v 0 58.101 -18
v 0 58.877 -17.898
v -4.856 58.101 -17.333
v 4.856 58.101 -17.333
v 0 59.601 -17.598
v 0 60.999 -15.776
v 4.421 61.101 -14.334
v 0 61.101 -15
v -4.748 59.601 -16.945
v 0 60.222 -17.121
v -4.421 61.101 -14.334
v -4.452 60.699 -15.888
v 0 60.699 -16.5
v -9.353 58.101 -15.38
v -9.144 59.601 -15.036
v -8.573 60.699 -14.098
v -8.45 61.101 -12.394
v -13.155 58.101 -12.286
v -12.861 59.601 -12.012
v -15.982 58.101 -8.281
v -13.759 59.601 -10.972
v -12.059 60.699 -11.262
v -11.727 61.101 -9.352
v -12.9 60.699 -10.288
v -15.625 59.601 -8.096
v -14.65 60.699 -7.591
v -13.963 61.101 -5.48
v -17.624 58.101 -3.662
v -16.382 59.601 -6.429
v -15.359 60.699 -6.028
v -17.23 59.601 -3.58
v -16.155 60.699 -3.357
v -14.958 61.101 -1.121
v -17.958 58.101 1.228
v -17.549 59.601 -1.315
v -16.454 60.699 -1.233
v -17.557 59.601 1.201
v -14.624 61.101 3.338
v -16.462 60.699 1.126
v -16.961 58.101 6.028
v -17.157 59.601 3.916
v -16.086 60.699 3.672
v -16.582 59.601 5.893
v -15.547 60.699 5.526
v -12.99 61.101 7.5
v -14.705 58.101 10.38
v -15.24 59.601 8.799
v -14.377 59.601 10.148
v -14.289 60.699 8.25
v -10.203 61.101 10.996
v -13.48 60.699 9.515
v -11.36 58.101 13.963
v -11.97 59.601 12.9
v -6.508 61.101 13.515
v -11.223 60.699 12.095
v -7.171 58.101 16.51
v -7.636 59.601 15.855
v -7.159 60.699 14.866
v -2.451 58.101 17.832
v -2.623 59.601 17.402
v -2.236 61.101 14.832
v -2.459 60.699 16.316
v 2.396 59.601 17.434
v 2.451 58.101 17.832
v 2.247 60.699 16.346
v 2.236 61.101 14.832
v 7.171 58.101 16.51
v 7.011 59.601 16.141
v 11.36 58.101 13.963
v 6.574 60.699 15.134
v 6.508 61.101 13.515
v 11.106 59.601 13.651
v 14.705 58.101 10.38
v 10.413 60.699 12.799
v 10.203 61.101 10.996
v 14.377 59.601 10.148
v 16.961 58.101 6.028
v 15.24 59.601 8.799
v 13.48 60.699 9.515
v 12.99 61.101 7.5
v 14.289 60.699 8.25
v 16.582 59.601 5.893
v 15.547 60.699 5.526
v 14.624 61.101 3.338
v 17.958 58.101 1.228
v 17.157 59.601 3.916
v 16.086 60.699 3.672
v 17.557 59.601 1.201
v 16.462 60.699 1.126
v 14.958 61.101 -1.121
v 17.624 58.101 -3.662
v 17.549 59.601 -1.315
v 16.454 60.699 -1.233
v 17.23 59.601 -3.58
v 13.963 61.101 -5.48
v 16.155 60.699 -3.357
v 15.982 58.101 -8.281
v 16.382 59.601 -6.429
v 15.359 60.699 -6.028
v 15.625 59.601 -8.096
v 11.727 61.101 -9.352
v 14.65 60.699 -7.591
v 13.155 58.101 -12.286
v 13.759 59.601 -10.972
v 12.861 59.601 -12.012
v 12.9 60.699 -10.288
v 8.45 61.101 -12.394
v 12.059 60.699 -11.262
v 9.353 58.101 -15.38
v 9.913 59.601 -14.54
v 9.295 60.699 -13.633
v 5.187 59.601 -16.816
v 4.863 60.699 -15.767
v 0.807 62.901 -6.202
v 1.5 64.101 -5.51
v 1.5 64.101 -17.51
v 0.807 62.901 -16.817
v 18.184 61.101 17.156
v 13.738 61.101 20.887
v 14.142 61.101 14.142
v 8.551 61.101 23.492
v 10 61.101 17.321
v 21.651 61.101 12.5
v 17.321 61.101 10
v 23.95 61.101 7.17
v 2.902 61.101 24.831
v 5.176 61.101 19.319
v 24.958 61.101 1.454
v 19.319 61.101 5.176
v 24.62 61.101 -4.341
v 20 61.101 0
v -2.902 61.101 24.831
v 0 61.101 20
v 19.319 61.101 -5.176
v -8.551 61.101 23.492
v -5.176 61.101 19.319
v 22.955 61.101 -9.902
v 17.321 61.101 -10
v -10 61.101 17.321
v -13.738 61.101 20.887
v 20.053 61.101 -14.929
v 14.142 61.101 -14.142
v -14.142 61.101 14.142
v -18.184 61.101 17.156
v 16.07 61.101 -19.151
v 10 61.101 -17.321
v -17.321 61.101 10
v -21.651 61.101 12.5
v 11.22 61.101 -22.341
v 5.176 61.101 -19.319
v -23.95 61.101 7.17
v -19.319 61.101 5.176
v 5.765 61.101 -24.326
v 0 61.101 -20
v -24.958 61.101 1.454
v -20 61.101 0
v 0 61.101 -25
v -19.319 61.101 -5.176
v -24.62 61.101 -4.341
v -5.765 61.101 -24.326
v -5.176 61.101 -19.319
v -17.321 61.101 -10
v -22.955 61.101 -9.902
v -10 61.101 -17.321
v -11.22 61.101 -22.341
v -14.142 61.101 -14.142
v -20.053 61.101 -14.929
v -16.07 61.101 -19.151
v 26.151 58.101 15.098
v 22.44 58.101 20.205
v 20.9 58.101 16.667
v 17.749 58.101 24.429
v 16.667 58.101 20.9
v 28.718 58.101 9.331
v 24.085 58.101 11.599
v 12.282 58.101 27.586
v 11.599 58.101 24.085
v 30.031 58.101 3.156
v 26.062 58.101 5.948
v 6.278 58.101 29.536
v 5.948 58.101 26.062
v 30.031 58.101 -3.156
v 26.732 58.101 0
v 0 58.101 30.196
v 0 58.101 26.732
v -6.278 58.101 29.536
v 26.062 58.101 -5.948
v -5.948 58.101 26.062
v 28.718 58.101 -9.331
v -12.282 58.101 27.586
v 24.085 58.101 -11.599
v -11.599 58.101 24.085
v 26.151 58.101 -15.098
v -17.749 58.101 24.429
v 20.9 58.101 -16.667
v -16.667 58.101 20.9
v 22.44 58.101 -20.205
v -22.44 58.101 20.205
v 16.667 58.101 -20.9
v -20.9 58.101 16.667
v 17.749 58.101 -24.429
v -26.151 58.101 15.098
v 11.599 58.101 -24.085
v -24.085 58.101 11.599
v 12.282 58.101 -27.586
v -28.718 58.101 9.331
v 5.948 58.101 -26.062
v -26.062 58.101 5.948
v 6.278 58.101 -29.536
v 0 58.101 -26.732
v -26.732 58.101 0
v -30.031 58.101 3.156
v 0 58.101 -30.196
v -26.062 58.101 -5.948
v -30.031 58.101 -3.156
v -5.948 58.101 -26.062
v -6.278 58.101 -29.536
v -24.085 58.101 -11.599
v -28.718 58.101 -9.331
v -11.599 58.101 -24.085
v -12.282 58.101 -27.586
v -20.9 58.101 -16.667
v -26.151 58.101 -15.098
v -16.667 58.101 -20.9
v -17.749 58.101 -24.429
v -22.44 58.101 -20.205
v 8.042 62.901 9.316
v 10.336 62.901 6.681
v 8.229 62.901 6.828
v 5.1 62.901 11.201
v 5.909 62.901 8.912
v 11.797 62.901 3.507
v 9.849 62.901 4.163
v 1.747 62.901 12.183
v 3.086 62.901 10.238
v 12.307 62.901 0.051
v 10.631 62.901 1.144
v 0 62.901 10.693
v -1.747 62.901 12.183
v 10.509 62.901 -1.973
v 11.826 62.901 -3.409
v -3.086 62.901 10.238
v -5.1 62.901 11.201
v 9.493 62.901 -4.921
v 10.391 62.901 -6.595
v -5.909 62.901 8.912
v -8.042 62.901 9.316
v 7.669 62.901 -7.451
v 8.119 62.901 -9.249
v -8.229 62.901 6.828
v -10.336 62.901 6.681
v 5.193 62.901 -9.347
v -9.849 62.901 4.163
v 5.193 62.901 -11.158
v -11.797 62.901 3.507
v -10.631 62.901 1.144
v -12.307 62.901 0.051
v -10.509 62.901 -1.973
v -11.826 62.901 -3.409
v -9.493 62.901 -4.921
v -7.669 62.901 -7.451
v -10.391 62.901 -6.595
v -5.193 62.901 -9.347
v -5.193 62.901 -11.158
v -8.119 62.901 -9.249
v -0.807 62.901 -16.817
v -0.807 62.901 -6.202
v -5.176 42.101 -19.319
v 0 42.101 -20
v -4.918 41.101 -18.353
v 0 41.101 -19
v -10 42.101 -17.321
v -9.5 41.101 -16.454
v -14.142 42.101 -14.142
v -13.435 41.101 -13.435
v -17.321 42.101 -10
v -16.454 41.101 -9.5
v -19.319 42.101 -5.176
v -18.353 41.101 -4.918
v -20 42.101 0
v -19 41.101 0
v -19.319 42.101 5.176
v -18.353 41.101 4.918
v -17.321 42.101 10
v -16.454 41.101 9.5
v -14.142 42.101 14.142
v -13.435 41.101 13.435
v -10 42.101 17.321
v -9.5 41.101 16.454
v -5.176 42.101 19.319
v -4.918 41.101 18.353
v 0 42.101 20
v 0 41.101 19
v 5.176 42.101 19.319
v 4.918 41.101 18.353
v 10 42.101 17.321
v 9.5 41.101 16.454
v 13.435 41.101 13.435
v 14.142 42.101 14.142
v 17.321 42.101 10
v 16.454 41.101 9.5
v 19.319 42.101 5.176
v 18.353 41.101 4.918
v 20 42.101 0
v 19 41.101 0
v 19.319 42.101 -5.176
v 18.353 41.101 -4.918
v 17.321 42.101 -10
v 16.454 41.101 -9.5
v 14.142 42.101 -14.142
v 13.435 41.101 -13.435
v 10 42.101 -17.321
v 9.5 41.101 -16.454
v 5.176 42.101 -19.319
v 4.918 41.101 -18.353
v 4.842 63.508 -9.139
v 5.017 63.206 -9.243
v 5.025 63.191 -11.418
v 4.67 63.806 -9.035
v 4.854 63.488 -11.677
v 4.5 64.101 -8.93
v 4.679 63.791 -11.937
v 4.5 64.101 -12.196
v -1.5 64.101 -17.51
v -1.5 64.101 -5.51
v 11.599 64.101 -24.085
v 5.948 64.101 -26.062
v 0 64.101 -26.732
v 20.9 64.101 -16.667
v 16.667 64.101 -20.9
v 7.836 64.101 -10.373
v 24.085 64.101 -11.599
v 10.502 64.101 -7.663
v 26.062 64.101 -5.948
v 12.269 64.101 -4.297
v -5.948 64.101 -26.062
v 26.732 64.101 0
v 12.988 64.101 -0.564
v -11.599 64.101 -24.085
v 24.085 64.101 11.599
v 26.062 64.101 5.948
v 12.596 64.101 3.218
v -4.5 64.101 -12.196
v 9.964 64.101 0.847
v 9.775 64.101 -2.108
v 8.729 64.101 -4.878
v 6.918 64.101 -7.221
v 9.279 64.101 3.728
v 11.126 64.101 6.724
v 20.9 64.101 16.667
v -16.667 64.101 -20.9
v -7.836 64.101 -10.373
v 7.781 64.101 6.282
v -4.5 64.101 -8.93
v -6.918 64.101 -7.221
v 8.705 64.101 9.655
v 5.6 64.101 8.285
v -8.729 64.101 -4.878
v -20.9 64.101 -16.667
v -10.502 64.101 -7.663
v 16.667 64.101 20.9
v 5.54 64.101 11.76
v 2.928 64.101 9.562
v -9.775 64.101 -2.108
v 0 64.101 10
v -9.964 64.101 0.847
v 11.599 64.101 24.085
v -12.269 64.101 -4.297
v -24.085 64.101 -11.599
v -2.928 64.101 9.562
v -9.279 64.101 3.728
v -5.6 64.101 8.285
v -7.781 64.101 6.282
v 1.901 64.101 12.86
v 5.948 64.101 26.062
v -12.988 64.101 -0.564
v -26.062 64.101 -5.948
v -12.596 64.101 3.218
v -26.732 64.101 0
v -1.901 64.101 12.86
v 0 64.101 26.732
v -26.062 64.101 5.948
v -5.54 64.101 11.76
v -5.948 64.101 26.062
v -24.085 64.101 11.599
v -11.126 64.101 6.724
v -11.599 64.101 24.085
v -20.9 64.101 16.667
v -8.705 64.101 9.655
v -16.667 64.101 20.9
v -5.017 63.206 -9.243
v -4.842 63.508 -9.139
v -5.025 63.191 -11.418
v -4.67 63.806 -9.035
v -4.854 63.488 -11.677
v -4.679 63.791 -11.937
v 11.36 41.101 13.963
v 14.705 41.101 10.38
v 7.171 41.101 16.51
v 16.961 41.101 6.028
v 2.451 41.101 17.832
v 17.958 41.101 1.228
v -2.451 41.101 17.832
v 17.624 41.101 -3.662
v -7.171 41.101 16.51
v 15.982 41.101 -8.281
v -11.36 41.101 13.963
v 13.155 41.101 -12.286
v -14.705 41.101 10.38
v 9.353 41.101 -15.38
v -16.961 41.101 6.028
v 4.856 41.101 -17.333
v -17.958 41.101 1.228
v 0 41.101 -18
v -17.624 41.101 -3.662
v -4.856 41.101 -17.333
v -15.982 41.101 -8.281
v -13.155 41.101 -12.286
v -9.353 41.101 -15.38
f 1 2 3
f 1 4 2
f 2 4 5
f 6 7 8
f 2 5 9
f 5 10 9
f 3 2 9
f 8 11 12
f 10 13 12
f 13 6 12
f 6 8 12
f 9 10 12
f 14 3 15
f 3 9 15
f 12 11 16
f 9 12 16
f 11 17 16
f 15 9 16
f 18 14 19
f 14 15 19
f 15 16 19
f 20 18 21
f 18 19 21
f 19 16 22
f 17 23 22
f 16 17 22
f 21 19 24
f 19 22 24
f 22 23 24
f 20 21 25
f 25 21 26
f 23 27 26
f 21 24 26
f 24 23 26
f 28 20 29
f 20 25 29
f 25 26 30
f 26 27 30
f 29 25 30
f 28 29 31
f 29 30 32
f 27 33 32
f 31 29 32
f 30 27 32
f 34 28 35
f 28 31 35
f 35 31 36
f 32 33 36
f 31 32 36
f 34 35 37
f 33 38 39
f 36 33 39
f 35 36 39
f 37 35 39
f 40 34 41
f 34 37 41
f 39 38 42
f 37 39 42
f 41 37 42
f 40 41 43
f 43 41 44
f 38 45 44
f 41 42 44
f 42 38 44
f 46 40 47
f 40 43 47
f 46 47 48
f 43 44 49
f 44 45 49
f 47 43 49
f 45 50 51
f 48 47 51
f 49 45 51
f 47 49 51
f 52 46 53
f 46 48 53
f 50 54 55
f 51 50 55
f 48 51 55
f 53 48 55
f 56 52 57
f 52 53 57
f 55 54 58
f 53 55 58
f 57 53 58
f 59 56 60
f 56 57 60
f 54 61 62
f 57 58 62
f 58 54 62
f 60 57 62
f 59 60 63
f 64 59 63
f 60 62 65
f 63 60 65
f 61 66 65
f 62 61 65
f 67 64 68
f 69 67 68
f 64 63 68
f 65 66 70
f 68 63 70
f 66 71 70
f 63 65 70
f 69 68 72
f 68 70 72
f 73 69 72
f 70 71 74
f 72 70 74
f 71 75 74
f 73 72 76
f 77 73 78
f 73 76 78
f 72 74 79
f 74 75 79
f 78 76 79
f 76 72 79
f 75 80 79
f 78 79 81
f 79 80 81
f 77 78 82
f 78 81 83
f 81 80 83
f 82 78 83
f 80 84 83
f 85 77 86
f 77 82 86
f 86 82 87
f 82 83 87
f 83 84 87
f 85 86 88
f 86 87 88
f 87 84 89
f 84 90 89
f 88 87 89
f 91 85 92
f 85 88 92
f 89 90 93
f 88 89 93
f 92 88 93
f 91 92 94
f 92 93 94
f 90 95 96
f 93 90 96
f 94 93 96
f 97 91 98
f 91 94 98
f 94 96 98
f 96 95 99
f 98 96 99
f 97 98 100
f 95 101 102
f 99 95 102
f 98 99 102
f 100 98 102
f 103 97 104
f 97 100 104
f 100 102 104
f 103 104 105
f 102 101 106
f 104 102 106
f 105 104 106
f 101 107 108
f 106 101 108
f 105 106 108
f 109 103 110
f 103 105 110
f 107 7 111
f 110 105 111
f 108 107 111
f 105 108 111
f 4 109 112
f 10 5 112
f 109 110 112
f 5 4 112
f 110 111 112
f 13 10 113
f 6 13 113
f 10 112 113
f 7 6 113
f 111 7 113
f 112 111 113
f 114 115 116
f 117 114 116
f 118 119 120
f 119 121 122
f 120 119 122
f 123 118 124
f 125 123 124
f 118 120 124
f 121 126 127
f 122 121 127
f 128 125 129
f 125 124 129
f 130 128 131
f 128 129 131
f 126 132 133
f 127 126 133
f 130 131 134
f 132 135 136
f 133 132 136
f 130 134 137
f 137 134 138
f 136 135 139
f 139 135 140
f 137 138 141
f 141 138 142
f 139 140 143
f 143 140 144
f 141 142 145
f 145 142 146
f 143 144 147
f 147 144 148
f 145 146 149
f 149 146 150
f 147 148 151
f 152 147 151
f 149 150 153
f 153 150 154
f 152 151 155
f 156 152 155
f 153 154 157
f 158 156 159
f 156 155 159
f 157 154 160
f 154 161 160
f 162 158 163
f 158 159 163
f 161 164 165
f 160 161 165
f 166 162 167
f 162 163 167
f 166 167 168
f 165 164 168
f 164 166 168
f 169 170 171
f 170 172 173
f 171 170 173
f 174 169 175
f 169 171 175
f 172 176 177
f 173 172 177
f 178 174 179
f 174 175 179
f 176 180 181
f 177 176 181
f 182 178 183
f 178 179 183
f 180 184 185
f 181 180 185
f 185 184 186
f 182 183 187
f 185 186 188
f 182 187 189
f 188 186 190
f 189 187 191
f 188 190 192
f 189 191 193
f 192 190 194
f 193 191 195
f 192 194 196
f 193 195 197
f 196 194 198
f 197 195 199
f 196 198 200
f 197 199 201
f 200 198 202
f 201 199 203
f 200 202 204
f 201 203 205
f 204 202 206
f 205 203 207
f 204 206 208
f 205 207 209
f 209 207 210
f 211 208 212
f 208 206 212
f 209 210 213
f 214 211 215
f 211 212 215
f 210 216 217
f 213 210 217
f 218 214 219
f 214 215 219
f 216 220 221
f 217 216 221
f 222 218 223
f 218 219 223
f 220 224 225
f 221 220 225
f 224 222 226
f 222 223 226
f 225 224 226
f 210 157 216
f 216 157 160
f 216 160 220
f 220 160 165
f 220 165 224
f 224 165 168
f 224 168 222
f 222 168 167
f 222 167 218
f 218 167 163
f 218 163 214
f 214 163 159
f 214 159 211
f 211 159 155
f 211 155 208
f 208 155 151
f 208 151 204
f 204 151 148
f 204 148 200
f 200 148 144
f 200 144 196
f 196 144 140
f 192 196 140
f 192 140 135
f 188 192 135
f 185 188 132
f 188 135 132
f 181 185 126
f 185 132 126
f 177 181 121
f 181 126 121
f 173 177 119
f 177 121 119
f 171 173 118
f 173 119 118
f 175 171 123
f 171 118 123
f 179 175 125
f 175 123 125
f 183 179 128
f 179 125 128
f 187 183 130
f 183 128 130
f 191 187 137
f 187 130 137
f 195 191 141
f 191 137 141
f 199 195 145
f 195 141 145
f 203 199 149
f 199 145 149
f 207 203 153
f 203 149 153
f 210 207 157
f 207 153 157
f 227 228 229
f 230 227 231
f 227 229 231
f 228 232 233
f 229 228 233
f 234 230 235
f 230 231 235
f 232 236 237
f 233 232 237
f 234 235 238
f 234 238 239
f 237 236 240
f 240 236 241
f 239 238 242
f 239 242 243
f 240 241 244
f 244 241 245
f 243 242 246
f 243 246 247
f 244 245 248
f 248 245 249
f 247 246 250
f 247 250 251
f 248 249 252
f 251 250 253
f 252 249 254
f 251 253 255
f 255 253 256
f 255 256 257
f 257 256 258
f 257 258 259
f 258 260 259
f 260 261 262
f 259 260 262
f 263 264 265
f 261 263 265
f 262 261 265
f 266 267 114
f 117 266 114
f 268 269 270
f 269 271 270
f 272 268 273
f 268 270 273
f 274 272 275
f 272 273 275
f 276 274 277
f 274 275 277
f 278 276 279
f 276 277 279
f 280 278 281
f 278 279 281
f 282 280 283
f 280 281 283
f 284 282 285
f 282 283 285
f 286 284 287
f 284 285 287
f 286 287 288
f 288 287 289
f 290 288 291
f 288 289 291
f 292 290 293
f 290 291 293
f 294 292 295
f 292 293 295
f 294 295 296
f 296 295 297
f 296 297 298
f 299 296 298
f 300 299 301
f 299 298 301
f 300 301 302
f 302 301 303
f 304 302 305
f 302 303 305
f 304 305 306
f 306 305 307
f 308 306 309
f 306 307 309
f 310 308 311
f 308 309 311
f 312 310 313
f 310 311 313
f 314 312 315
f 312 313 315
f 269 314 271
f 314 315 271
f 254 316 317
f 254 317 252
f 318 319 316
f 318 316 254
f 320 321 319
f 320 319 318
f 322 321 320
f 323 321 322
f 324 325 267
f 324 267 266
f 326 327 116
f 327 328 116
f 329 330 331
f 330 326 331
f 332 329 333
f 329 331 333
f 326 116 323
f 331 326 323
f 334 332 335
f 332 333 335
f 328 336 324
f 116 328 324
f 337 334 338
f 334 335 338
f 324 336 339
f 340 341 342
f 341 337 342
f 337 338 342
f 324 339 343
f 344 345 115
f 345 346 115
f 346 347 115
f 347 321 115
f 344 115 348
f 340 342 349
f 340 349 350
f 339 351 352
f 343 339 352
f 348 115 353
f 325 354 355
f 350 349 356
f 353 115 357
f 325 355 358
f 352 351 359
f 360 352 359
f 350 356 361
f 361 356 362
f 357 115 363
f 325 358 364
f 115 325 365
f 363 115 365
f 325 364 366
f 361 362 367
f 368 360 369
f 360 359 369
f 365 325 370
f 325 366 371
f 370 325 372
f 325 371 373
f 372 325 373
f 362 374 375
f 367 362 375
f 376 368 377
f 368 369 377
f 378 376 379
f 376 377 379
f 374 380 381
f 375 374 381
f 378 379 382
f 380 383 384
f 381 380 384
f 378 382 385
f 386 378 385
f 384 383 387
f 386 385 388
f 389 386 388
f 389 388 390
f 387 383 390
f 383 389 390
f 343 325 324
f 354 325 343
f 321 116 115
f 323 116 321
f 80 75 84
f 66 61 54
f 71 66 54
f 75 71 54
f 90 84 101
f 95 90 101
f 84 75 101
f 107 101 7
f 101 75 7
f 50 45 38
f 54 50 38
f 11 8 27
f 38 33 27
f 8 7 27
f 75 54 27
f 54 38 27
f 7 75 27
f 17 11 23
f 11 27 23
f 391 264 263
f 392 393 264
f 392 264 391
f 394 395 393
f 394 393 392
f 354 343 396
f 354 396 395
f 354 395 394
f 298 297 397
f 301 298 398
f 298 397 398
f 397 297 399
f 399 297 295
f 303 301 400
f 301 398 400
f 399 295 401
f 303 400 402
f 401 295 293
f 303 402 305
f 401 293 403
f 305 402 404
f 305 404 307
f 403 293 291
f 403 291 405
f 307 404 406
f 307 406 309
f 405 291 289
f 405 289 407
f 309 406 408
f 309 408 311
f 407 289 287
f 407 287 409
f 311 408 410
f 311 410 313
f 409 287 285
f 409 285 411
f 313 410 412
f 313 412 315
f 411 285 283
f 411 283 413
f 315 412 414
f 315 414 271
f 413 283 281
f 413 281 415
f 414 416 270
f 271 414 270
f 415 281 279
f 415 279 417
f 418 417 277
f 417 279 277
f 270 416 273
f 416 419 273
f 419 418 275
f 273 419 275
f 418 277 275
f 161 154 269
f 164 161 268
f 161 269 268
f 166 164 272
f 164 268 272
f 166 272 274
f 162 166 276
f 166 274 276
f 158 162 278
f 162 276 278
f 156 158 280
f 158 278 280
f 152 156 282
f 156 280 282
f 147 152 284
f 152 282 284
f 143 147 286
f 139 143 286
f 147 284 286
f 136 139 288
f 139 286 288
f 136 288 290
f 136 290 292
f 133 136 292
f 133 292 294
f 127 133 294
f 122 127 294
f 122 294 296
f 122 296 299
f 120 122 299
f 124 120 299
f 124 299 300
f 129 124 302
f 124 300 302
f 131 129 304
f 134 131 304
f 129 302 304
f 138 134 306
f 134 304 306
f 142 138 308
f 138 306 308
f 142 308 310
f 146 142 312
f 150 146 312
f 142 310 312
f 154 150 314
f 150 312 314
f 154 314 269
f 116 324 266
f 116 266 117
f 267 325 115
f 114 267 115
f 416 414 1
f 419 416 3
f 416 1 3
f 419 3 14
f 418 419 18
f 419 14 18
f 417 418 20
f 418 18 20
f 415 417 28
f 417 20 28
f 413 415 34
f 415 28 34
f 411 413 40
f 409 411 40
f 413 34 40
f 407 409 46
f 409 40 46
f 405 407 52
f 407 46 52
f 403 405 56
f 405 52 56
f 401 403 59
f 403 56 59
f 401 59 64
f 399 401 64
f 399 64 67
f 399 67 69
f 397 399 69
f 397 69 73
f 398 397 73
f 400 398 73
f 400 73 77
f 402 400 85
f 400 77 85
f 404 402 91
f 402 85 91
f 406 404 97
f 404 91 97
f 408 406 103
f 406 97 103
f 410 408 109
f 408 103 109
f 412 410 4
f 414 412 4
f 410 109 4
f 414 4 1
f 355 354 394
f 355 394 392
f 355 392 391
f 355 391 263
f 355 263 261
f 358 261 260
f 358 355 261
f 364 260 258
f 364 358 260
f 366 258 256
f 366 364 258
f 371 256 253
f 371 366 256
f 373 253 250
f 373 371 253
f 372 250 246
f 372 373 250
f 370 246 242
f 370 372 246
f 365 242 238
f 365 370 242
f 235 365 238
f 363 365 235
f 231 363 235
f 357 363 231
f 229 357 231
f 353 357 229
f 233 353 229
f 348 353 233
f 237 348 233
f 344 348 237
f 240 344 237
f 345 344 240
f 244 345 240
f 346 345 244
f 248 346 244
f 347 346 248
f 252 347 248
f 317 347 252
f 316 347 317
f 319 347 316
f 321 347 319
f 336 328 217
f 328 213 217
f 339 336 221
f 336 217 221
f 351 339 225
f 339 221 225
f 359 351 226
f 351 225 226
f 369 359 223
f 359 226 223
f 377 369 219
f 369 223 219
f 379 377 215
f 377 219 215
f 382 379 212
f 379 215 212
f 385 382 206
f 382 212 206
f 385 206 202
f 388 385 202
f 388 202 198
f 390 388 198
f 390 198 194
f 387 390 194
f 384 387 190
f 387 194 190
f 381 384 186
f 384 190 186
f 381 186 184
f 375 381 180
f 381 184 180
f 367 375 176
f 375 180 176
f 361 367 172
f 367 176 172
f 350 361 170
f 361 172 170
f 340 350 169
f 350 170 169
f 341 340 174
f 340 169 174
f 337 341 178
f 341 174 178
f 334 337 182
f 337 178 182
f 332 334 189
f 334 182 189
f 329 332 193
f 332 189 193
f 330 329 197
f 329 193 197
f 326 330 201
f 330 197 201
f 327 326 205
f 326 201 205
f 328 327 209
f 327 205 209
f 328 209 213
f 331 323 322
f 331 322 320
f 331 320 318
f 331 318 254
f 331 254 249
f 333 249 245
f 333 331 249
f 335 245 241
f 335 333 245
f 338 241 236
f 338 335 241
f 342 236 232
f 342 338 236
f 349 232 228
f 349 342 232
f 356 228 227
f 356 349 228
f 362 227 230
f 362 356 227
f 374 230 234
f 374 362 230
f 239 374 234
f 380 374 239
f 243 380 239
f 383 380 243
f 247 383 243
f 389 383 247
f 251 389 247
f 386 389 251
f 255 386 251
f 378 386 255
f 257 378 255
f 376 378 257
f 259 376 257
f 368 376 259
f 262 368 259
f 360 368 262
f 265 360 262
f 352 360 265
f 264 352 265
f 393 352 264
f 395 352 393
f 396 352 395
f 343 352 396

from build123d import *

# Parameters (mm, degrees)
CUT_EXTRUDE_1_DEPTH           = 1.2
CUT_EXTRUDE_1_DRAFT           = -30
SKETCH_3_W                    = 3
SKETCH_3_H                    = 12
CUT_EXTRUDE_1_PROFILE_2_DEPTH = 1.2
CUT_EXTRUDE_1_PROFILE_2_DRAFT = -30


with BuildPart() as part:
    # Эскиз1 → Повернуть1 (revolve)
    with BuildSketch(Plane.XY, mode=Mode.PRIVATE) as revolve_1_sk:
        with BuildLine():
            Line((0, 64.100995099), (-26.732050808, 64.100995099))
            Line((-26.732050808, 64.100995099), (-30.196152423, 58.100995099))
            Line((-30.196152423, 58.100995099), (-26.732050808, 58.100995099))
            Line((-26.732050808, 58.100995099), (-25, 61.100995099))
            Line((-25, 61.100995099), (-20, 61.100995099))
            Line((-20, 61.100995099), (-20, 42.100995099))
            Line((-20, 42.100995099), (-19, 41.100995099))
            Line((-19, 41.100995099), (-18, 41.100995099))
            Line((-18, 41.100995099), (-18, 58.100995099))
            ThreePointArc((-18, 58.100995099), (-17.121320344, 60.222315442), (-15, 61.100995099))
            Line((-15, 61.100995099), (0, 61.100995099))
            Line((0, 61.100995099), (0, 64.100995099))
        make_face()
    revolve(revolve_1_sk.sketch.rotate(Axis((0, 61.100995099, 0), (0, 1, 0)), 270), axis=Axis((0, 61.100995099, 0), (0, 1, 0)))


with BuildPart() as cut_extrude_1_tool:
    # Эскиз3 → Вырез-Вытянуть1 (with draft: the straight prism first)
    with BuildSketch(Plane(origin=(0, 64.100995099, 0), x_dir=(1, 0, 0), z_dir=(0, 1, 0))):
        with BuildLine():
            Line((-4.5, 12.196310918), (-4.5, 8.93028555))
            ThreePointArc((-4.5, 8.93028555), (0, -10), (4.5, 8.93028555))
            Line((4.5, 8.93028555), (4.5, 12.196310918))
            ThreePointArc((4.5, 12.196310918), (0, -13), (-4.5, 12.196310918))
        make_face()
    extrude(amount=-CUT_EXTRUDE_1_DEPTH)
    # Вырез-Вытянуть1: the draft: its side faces are tilted about the plane it starts from
    cut_extrude_1_sides = [cut_extrude_1_tool.faces().sort_by_distance(p)[0] for p in [
        (-4.5, 63.500995099, -10.563298234),
        (0, 63.500995099, 10),
        (4.5, 63.500995099, -10.563298234),
        (0, 63.500995099, 13),
    ]]
    draft(cut_extrude_1_sides, Plane(origin=(0, 64.100995099, 0), x_dir=(1, 0, 0), z_dir=(0, 1, 0)), CUT_EXTRUDE_1_DRAFT)


with BuildPart() as part_1:
    add(part.part)

    # Вырез-Вытянуть1: cut by cut_extrude_1_tool
    add(cut_extrude_1_tool.part, mode=Mode.SUBTRACT)


with BuildPart() as cut_extrude_1_profile_2_tool:
    # Эскиз3 → Вырез-Вытянуть1 profile 2 (with draft: the straight prism first)
    with BuildSketch(Plane(origin=(0, 64.100995099, 0), x_dir=(1, 0, 0), z_dir=(0, 1, 0))):
        with Locations((0, 11.509630879)):
            Rectangle(SKETCH_3_W, SKETCH_3_H)
    extrude(amount=-CUT_EXTRUDE_1_PROFILE_2_DEPTH)
    # Вырез-Вытянуть1 profile 2: the draft: its side faces are tilted about the plane it starts from
    cut_extrude_1_profile_2_sides = [cut_extrude_1_profile_2_tool.faces().sort_by_distance(p)[0] for p in [
        (-1.5, 63.500995099, -11.509630879),
        (0, 63.500995099, -5.509630879),
        (1.5, 63.500995099, -11.509630879),
        (0, 63.500995099, -17.509630879),
    ]]
    draft(cut_extrude_1_profile_2_sides, Plane(origin=(0, 64.100995099, 0), x_dir=(1, 0, 0), z_dir=(0, 1, 0)), CUT_EXTRUDE_1_PROFILE_2_DRAFT)


with BuildPart() as part_2:
    add(part_1.part)

    # Вырез-Вытянуть1 profile 2: cut by cut_extrude_1_profile_2_tool
    add(cut_extrude_1_profile_2_tool.part, mode=Mode.SUBTRACT)


solid = part_2.part
